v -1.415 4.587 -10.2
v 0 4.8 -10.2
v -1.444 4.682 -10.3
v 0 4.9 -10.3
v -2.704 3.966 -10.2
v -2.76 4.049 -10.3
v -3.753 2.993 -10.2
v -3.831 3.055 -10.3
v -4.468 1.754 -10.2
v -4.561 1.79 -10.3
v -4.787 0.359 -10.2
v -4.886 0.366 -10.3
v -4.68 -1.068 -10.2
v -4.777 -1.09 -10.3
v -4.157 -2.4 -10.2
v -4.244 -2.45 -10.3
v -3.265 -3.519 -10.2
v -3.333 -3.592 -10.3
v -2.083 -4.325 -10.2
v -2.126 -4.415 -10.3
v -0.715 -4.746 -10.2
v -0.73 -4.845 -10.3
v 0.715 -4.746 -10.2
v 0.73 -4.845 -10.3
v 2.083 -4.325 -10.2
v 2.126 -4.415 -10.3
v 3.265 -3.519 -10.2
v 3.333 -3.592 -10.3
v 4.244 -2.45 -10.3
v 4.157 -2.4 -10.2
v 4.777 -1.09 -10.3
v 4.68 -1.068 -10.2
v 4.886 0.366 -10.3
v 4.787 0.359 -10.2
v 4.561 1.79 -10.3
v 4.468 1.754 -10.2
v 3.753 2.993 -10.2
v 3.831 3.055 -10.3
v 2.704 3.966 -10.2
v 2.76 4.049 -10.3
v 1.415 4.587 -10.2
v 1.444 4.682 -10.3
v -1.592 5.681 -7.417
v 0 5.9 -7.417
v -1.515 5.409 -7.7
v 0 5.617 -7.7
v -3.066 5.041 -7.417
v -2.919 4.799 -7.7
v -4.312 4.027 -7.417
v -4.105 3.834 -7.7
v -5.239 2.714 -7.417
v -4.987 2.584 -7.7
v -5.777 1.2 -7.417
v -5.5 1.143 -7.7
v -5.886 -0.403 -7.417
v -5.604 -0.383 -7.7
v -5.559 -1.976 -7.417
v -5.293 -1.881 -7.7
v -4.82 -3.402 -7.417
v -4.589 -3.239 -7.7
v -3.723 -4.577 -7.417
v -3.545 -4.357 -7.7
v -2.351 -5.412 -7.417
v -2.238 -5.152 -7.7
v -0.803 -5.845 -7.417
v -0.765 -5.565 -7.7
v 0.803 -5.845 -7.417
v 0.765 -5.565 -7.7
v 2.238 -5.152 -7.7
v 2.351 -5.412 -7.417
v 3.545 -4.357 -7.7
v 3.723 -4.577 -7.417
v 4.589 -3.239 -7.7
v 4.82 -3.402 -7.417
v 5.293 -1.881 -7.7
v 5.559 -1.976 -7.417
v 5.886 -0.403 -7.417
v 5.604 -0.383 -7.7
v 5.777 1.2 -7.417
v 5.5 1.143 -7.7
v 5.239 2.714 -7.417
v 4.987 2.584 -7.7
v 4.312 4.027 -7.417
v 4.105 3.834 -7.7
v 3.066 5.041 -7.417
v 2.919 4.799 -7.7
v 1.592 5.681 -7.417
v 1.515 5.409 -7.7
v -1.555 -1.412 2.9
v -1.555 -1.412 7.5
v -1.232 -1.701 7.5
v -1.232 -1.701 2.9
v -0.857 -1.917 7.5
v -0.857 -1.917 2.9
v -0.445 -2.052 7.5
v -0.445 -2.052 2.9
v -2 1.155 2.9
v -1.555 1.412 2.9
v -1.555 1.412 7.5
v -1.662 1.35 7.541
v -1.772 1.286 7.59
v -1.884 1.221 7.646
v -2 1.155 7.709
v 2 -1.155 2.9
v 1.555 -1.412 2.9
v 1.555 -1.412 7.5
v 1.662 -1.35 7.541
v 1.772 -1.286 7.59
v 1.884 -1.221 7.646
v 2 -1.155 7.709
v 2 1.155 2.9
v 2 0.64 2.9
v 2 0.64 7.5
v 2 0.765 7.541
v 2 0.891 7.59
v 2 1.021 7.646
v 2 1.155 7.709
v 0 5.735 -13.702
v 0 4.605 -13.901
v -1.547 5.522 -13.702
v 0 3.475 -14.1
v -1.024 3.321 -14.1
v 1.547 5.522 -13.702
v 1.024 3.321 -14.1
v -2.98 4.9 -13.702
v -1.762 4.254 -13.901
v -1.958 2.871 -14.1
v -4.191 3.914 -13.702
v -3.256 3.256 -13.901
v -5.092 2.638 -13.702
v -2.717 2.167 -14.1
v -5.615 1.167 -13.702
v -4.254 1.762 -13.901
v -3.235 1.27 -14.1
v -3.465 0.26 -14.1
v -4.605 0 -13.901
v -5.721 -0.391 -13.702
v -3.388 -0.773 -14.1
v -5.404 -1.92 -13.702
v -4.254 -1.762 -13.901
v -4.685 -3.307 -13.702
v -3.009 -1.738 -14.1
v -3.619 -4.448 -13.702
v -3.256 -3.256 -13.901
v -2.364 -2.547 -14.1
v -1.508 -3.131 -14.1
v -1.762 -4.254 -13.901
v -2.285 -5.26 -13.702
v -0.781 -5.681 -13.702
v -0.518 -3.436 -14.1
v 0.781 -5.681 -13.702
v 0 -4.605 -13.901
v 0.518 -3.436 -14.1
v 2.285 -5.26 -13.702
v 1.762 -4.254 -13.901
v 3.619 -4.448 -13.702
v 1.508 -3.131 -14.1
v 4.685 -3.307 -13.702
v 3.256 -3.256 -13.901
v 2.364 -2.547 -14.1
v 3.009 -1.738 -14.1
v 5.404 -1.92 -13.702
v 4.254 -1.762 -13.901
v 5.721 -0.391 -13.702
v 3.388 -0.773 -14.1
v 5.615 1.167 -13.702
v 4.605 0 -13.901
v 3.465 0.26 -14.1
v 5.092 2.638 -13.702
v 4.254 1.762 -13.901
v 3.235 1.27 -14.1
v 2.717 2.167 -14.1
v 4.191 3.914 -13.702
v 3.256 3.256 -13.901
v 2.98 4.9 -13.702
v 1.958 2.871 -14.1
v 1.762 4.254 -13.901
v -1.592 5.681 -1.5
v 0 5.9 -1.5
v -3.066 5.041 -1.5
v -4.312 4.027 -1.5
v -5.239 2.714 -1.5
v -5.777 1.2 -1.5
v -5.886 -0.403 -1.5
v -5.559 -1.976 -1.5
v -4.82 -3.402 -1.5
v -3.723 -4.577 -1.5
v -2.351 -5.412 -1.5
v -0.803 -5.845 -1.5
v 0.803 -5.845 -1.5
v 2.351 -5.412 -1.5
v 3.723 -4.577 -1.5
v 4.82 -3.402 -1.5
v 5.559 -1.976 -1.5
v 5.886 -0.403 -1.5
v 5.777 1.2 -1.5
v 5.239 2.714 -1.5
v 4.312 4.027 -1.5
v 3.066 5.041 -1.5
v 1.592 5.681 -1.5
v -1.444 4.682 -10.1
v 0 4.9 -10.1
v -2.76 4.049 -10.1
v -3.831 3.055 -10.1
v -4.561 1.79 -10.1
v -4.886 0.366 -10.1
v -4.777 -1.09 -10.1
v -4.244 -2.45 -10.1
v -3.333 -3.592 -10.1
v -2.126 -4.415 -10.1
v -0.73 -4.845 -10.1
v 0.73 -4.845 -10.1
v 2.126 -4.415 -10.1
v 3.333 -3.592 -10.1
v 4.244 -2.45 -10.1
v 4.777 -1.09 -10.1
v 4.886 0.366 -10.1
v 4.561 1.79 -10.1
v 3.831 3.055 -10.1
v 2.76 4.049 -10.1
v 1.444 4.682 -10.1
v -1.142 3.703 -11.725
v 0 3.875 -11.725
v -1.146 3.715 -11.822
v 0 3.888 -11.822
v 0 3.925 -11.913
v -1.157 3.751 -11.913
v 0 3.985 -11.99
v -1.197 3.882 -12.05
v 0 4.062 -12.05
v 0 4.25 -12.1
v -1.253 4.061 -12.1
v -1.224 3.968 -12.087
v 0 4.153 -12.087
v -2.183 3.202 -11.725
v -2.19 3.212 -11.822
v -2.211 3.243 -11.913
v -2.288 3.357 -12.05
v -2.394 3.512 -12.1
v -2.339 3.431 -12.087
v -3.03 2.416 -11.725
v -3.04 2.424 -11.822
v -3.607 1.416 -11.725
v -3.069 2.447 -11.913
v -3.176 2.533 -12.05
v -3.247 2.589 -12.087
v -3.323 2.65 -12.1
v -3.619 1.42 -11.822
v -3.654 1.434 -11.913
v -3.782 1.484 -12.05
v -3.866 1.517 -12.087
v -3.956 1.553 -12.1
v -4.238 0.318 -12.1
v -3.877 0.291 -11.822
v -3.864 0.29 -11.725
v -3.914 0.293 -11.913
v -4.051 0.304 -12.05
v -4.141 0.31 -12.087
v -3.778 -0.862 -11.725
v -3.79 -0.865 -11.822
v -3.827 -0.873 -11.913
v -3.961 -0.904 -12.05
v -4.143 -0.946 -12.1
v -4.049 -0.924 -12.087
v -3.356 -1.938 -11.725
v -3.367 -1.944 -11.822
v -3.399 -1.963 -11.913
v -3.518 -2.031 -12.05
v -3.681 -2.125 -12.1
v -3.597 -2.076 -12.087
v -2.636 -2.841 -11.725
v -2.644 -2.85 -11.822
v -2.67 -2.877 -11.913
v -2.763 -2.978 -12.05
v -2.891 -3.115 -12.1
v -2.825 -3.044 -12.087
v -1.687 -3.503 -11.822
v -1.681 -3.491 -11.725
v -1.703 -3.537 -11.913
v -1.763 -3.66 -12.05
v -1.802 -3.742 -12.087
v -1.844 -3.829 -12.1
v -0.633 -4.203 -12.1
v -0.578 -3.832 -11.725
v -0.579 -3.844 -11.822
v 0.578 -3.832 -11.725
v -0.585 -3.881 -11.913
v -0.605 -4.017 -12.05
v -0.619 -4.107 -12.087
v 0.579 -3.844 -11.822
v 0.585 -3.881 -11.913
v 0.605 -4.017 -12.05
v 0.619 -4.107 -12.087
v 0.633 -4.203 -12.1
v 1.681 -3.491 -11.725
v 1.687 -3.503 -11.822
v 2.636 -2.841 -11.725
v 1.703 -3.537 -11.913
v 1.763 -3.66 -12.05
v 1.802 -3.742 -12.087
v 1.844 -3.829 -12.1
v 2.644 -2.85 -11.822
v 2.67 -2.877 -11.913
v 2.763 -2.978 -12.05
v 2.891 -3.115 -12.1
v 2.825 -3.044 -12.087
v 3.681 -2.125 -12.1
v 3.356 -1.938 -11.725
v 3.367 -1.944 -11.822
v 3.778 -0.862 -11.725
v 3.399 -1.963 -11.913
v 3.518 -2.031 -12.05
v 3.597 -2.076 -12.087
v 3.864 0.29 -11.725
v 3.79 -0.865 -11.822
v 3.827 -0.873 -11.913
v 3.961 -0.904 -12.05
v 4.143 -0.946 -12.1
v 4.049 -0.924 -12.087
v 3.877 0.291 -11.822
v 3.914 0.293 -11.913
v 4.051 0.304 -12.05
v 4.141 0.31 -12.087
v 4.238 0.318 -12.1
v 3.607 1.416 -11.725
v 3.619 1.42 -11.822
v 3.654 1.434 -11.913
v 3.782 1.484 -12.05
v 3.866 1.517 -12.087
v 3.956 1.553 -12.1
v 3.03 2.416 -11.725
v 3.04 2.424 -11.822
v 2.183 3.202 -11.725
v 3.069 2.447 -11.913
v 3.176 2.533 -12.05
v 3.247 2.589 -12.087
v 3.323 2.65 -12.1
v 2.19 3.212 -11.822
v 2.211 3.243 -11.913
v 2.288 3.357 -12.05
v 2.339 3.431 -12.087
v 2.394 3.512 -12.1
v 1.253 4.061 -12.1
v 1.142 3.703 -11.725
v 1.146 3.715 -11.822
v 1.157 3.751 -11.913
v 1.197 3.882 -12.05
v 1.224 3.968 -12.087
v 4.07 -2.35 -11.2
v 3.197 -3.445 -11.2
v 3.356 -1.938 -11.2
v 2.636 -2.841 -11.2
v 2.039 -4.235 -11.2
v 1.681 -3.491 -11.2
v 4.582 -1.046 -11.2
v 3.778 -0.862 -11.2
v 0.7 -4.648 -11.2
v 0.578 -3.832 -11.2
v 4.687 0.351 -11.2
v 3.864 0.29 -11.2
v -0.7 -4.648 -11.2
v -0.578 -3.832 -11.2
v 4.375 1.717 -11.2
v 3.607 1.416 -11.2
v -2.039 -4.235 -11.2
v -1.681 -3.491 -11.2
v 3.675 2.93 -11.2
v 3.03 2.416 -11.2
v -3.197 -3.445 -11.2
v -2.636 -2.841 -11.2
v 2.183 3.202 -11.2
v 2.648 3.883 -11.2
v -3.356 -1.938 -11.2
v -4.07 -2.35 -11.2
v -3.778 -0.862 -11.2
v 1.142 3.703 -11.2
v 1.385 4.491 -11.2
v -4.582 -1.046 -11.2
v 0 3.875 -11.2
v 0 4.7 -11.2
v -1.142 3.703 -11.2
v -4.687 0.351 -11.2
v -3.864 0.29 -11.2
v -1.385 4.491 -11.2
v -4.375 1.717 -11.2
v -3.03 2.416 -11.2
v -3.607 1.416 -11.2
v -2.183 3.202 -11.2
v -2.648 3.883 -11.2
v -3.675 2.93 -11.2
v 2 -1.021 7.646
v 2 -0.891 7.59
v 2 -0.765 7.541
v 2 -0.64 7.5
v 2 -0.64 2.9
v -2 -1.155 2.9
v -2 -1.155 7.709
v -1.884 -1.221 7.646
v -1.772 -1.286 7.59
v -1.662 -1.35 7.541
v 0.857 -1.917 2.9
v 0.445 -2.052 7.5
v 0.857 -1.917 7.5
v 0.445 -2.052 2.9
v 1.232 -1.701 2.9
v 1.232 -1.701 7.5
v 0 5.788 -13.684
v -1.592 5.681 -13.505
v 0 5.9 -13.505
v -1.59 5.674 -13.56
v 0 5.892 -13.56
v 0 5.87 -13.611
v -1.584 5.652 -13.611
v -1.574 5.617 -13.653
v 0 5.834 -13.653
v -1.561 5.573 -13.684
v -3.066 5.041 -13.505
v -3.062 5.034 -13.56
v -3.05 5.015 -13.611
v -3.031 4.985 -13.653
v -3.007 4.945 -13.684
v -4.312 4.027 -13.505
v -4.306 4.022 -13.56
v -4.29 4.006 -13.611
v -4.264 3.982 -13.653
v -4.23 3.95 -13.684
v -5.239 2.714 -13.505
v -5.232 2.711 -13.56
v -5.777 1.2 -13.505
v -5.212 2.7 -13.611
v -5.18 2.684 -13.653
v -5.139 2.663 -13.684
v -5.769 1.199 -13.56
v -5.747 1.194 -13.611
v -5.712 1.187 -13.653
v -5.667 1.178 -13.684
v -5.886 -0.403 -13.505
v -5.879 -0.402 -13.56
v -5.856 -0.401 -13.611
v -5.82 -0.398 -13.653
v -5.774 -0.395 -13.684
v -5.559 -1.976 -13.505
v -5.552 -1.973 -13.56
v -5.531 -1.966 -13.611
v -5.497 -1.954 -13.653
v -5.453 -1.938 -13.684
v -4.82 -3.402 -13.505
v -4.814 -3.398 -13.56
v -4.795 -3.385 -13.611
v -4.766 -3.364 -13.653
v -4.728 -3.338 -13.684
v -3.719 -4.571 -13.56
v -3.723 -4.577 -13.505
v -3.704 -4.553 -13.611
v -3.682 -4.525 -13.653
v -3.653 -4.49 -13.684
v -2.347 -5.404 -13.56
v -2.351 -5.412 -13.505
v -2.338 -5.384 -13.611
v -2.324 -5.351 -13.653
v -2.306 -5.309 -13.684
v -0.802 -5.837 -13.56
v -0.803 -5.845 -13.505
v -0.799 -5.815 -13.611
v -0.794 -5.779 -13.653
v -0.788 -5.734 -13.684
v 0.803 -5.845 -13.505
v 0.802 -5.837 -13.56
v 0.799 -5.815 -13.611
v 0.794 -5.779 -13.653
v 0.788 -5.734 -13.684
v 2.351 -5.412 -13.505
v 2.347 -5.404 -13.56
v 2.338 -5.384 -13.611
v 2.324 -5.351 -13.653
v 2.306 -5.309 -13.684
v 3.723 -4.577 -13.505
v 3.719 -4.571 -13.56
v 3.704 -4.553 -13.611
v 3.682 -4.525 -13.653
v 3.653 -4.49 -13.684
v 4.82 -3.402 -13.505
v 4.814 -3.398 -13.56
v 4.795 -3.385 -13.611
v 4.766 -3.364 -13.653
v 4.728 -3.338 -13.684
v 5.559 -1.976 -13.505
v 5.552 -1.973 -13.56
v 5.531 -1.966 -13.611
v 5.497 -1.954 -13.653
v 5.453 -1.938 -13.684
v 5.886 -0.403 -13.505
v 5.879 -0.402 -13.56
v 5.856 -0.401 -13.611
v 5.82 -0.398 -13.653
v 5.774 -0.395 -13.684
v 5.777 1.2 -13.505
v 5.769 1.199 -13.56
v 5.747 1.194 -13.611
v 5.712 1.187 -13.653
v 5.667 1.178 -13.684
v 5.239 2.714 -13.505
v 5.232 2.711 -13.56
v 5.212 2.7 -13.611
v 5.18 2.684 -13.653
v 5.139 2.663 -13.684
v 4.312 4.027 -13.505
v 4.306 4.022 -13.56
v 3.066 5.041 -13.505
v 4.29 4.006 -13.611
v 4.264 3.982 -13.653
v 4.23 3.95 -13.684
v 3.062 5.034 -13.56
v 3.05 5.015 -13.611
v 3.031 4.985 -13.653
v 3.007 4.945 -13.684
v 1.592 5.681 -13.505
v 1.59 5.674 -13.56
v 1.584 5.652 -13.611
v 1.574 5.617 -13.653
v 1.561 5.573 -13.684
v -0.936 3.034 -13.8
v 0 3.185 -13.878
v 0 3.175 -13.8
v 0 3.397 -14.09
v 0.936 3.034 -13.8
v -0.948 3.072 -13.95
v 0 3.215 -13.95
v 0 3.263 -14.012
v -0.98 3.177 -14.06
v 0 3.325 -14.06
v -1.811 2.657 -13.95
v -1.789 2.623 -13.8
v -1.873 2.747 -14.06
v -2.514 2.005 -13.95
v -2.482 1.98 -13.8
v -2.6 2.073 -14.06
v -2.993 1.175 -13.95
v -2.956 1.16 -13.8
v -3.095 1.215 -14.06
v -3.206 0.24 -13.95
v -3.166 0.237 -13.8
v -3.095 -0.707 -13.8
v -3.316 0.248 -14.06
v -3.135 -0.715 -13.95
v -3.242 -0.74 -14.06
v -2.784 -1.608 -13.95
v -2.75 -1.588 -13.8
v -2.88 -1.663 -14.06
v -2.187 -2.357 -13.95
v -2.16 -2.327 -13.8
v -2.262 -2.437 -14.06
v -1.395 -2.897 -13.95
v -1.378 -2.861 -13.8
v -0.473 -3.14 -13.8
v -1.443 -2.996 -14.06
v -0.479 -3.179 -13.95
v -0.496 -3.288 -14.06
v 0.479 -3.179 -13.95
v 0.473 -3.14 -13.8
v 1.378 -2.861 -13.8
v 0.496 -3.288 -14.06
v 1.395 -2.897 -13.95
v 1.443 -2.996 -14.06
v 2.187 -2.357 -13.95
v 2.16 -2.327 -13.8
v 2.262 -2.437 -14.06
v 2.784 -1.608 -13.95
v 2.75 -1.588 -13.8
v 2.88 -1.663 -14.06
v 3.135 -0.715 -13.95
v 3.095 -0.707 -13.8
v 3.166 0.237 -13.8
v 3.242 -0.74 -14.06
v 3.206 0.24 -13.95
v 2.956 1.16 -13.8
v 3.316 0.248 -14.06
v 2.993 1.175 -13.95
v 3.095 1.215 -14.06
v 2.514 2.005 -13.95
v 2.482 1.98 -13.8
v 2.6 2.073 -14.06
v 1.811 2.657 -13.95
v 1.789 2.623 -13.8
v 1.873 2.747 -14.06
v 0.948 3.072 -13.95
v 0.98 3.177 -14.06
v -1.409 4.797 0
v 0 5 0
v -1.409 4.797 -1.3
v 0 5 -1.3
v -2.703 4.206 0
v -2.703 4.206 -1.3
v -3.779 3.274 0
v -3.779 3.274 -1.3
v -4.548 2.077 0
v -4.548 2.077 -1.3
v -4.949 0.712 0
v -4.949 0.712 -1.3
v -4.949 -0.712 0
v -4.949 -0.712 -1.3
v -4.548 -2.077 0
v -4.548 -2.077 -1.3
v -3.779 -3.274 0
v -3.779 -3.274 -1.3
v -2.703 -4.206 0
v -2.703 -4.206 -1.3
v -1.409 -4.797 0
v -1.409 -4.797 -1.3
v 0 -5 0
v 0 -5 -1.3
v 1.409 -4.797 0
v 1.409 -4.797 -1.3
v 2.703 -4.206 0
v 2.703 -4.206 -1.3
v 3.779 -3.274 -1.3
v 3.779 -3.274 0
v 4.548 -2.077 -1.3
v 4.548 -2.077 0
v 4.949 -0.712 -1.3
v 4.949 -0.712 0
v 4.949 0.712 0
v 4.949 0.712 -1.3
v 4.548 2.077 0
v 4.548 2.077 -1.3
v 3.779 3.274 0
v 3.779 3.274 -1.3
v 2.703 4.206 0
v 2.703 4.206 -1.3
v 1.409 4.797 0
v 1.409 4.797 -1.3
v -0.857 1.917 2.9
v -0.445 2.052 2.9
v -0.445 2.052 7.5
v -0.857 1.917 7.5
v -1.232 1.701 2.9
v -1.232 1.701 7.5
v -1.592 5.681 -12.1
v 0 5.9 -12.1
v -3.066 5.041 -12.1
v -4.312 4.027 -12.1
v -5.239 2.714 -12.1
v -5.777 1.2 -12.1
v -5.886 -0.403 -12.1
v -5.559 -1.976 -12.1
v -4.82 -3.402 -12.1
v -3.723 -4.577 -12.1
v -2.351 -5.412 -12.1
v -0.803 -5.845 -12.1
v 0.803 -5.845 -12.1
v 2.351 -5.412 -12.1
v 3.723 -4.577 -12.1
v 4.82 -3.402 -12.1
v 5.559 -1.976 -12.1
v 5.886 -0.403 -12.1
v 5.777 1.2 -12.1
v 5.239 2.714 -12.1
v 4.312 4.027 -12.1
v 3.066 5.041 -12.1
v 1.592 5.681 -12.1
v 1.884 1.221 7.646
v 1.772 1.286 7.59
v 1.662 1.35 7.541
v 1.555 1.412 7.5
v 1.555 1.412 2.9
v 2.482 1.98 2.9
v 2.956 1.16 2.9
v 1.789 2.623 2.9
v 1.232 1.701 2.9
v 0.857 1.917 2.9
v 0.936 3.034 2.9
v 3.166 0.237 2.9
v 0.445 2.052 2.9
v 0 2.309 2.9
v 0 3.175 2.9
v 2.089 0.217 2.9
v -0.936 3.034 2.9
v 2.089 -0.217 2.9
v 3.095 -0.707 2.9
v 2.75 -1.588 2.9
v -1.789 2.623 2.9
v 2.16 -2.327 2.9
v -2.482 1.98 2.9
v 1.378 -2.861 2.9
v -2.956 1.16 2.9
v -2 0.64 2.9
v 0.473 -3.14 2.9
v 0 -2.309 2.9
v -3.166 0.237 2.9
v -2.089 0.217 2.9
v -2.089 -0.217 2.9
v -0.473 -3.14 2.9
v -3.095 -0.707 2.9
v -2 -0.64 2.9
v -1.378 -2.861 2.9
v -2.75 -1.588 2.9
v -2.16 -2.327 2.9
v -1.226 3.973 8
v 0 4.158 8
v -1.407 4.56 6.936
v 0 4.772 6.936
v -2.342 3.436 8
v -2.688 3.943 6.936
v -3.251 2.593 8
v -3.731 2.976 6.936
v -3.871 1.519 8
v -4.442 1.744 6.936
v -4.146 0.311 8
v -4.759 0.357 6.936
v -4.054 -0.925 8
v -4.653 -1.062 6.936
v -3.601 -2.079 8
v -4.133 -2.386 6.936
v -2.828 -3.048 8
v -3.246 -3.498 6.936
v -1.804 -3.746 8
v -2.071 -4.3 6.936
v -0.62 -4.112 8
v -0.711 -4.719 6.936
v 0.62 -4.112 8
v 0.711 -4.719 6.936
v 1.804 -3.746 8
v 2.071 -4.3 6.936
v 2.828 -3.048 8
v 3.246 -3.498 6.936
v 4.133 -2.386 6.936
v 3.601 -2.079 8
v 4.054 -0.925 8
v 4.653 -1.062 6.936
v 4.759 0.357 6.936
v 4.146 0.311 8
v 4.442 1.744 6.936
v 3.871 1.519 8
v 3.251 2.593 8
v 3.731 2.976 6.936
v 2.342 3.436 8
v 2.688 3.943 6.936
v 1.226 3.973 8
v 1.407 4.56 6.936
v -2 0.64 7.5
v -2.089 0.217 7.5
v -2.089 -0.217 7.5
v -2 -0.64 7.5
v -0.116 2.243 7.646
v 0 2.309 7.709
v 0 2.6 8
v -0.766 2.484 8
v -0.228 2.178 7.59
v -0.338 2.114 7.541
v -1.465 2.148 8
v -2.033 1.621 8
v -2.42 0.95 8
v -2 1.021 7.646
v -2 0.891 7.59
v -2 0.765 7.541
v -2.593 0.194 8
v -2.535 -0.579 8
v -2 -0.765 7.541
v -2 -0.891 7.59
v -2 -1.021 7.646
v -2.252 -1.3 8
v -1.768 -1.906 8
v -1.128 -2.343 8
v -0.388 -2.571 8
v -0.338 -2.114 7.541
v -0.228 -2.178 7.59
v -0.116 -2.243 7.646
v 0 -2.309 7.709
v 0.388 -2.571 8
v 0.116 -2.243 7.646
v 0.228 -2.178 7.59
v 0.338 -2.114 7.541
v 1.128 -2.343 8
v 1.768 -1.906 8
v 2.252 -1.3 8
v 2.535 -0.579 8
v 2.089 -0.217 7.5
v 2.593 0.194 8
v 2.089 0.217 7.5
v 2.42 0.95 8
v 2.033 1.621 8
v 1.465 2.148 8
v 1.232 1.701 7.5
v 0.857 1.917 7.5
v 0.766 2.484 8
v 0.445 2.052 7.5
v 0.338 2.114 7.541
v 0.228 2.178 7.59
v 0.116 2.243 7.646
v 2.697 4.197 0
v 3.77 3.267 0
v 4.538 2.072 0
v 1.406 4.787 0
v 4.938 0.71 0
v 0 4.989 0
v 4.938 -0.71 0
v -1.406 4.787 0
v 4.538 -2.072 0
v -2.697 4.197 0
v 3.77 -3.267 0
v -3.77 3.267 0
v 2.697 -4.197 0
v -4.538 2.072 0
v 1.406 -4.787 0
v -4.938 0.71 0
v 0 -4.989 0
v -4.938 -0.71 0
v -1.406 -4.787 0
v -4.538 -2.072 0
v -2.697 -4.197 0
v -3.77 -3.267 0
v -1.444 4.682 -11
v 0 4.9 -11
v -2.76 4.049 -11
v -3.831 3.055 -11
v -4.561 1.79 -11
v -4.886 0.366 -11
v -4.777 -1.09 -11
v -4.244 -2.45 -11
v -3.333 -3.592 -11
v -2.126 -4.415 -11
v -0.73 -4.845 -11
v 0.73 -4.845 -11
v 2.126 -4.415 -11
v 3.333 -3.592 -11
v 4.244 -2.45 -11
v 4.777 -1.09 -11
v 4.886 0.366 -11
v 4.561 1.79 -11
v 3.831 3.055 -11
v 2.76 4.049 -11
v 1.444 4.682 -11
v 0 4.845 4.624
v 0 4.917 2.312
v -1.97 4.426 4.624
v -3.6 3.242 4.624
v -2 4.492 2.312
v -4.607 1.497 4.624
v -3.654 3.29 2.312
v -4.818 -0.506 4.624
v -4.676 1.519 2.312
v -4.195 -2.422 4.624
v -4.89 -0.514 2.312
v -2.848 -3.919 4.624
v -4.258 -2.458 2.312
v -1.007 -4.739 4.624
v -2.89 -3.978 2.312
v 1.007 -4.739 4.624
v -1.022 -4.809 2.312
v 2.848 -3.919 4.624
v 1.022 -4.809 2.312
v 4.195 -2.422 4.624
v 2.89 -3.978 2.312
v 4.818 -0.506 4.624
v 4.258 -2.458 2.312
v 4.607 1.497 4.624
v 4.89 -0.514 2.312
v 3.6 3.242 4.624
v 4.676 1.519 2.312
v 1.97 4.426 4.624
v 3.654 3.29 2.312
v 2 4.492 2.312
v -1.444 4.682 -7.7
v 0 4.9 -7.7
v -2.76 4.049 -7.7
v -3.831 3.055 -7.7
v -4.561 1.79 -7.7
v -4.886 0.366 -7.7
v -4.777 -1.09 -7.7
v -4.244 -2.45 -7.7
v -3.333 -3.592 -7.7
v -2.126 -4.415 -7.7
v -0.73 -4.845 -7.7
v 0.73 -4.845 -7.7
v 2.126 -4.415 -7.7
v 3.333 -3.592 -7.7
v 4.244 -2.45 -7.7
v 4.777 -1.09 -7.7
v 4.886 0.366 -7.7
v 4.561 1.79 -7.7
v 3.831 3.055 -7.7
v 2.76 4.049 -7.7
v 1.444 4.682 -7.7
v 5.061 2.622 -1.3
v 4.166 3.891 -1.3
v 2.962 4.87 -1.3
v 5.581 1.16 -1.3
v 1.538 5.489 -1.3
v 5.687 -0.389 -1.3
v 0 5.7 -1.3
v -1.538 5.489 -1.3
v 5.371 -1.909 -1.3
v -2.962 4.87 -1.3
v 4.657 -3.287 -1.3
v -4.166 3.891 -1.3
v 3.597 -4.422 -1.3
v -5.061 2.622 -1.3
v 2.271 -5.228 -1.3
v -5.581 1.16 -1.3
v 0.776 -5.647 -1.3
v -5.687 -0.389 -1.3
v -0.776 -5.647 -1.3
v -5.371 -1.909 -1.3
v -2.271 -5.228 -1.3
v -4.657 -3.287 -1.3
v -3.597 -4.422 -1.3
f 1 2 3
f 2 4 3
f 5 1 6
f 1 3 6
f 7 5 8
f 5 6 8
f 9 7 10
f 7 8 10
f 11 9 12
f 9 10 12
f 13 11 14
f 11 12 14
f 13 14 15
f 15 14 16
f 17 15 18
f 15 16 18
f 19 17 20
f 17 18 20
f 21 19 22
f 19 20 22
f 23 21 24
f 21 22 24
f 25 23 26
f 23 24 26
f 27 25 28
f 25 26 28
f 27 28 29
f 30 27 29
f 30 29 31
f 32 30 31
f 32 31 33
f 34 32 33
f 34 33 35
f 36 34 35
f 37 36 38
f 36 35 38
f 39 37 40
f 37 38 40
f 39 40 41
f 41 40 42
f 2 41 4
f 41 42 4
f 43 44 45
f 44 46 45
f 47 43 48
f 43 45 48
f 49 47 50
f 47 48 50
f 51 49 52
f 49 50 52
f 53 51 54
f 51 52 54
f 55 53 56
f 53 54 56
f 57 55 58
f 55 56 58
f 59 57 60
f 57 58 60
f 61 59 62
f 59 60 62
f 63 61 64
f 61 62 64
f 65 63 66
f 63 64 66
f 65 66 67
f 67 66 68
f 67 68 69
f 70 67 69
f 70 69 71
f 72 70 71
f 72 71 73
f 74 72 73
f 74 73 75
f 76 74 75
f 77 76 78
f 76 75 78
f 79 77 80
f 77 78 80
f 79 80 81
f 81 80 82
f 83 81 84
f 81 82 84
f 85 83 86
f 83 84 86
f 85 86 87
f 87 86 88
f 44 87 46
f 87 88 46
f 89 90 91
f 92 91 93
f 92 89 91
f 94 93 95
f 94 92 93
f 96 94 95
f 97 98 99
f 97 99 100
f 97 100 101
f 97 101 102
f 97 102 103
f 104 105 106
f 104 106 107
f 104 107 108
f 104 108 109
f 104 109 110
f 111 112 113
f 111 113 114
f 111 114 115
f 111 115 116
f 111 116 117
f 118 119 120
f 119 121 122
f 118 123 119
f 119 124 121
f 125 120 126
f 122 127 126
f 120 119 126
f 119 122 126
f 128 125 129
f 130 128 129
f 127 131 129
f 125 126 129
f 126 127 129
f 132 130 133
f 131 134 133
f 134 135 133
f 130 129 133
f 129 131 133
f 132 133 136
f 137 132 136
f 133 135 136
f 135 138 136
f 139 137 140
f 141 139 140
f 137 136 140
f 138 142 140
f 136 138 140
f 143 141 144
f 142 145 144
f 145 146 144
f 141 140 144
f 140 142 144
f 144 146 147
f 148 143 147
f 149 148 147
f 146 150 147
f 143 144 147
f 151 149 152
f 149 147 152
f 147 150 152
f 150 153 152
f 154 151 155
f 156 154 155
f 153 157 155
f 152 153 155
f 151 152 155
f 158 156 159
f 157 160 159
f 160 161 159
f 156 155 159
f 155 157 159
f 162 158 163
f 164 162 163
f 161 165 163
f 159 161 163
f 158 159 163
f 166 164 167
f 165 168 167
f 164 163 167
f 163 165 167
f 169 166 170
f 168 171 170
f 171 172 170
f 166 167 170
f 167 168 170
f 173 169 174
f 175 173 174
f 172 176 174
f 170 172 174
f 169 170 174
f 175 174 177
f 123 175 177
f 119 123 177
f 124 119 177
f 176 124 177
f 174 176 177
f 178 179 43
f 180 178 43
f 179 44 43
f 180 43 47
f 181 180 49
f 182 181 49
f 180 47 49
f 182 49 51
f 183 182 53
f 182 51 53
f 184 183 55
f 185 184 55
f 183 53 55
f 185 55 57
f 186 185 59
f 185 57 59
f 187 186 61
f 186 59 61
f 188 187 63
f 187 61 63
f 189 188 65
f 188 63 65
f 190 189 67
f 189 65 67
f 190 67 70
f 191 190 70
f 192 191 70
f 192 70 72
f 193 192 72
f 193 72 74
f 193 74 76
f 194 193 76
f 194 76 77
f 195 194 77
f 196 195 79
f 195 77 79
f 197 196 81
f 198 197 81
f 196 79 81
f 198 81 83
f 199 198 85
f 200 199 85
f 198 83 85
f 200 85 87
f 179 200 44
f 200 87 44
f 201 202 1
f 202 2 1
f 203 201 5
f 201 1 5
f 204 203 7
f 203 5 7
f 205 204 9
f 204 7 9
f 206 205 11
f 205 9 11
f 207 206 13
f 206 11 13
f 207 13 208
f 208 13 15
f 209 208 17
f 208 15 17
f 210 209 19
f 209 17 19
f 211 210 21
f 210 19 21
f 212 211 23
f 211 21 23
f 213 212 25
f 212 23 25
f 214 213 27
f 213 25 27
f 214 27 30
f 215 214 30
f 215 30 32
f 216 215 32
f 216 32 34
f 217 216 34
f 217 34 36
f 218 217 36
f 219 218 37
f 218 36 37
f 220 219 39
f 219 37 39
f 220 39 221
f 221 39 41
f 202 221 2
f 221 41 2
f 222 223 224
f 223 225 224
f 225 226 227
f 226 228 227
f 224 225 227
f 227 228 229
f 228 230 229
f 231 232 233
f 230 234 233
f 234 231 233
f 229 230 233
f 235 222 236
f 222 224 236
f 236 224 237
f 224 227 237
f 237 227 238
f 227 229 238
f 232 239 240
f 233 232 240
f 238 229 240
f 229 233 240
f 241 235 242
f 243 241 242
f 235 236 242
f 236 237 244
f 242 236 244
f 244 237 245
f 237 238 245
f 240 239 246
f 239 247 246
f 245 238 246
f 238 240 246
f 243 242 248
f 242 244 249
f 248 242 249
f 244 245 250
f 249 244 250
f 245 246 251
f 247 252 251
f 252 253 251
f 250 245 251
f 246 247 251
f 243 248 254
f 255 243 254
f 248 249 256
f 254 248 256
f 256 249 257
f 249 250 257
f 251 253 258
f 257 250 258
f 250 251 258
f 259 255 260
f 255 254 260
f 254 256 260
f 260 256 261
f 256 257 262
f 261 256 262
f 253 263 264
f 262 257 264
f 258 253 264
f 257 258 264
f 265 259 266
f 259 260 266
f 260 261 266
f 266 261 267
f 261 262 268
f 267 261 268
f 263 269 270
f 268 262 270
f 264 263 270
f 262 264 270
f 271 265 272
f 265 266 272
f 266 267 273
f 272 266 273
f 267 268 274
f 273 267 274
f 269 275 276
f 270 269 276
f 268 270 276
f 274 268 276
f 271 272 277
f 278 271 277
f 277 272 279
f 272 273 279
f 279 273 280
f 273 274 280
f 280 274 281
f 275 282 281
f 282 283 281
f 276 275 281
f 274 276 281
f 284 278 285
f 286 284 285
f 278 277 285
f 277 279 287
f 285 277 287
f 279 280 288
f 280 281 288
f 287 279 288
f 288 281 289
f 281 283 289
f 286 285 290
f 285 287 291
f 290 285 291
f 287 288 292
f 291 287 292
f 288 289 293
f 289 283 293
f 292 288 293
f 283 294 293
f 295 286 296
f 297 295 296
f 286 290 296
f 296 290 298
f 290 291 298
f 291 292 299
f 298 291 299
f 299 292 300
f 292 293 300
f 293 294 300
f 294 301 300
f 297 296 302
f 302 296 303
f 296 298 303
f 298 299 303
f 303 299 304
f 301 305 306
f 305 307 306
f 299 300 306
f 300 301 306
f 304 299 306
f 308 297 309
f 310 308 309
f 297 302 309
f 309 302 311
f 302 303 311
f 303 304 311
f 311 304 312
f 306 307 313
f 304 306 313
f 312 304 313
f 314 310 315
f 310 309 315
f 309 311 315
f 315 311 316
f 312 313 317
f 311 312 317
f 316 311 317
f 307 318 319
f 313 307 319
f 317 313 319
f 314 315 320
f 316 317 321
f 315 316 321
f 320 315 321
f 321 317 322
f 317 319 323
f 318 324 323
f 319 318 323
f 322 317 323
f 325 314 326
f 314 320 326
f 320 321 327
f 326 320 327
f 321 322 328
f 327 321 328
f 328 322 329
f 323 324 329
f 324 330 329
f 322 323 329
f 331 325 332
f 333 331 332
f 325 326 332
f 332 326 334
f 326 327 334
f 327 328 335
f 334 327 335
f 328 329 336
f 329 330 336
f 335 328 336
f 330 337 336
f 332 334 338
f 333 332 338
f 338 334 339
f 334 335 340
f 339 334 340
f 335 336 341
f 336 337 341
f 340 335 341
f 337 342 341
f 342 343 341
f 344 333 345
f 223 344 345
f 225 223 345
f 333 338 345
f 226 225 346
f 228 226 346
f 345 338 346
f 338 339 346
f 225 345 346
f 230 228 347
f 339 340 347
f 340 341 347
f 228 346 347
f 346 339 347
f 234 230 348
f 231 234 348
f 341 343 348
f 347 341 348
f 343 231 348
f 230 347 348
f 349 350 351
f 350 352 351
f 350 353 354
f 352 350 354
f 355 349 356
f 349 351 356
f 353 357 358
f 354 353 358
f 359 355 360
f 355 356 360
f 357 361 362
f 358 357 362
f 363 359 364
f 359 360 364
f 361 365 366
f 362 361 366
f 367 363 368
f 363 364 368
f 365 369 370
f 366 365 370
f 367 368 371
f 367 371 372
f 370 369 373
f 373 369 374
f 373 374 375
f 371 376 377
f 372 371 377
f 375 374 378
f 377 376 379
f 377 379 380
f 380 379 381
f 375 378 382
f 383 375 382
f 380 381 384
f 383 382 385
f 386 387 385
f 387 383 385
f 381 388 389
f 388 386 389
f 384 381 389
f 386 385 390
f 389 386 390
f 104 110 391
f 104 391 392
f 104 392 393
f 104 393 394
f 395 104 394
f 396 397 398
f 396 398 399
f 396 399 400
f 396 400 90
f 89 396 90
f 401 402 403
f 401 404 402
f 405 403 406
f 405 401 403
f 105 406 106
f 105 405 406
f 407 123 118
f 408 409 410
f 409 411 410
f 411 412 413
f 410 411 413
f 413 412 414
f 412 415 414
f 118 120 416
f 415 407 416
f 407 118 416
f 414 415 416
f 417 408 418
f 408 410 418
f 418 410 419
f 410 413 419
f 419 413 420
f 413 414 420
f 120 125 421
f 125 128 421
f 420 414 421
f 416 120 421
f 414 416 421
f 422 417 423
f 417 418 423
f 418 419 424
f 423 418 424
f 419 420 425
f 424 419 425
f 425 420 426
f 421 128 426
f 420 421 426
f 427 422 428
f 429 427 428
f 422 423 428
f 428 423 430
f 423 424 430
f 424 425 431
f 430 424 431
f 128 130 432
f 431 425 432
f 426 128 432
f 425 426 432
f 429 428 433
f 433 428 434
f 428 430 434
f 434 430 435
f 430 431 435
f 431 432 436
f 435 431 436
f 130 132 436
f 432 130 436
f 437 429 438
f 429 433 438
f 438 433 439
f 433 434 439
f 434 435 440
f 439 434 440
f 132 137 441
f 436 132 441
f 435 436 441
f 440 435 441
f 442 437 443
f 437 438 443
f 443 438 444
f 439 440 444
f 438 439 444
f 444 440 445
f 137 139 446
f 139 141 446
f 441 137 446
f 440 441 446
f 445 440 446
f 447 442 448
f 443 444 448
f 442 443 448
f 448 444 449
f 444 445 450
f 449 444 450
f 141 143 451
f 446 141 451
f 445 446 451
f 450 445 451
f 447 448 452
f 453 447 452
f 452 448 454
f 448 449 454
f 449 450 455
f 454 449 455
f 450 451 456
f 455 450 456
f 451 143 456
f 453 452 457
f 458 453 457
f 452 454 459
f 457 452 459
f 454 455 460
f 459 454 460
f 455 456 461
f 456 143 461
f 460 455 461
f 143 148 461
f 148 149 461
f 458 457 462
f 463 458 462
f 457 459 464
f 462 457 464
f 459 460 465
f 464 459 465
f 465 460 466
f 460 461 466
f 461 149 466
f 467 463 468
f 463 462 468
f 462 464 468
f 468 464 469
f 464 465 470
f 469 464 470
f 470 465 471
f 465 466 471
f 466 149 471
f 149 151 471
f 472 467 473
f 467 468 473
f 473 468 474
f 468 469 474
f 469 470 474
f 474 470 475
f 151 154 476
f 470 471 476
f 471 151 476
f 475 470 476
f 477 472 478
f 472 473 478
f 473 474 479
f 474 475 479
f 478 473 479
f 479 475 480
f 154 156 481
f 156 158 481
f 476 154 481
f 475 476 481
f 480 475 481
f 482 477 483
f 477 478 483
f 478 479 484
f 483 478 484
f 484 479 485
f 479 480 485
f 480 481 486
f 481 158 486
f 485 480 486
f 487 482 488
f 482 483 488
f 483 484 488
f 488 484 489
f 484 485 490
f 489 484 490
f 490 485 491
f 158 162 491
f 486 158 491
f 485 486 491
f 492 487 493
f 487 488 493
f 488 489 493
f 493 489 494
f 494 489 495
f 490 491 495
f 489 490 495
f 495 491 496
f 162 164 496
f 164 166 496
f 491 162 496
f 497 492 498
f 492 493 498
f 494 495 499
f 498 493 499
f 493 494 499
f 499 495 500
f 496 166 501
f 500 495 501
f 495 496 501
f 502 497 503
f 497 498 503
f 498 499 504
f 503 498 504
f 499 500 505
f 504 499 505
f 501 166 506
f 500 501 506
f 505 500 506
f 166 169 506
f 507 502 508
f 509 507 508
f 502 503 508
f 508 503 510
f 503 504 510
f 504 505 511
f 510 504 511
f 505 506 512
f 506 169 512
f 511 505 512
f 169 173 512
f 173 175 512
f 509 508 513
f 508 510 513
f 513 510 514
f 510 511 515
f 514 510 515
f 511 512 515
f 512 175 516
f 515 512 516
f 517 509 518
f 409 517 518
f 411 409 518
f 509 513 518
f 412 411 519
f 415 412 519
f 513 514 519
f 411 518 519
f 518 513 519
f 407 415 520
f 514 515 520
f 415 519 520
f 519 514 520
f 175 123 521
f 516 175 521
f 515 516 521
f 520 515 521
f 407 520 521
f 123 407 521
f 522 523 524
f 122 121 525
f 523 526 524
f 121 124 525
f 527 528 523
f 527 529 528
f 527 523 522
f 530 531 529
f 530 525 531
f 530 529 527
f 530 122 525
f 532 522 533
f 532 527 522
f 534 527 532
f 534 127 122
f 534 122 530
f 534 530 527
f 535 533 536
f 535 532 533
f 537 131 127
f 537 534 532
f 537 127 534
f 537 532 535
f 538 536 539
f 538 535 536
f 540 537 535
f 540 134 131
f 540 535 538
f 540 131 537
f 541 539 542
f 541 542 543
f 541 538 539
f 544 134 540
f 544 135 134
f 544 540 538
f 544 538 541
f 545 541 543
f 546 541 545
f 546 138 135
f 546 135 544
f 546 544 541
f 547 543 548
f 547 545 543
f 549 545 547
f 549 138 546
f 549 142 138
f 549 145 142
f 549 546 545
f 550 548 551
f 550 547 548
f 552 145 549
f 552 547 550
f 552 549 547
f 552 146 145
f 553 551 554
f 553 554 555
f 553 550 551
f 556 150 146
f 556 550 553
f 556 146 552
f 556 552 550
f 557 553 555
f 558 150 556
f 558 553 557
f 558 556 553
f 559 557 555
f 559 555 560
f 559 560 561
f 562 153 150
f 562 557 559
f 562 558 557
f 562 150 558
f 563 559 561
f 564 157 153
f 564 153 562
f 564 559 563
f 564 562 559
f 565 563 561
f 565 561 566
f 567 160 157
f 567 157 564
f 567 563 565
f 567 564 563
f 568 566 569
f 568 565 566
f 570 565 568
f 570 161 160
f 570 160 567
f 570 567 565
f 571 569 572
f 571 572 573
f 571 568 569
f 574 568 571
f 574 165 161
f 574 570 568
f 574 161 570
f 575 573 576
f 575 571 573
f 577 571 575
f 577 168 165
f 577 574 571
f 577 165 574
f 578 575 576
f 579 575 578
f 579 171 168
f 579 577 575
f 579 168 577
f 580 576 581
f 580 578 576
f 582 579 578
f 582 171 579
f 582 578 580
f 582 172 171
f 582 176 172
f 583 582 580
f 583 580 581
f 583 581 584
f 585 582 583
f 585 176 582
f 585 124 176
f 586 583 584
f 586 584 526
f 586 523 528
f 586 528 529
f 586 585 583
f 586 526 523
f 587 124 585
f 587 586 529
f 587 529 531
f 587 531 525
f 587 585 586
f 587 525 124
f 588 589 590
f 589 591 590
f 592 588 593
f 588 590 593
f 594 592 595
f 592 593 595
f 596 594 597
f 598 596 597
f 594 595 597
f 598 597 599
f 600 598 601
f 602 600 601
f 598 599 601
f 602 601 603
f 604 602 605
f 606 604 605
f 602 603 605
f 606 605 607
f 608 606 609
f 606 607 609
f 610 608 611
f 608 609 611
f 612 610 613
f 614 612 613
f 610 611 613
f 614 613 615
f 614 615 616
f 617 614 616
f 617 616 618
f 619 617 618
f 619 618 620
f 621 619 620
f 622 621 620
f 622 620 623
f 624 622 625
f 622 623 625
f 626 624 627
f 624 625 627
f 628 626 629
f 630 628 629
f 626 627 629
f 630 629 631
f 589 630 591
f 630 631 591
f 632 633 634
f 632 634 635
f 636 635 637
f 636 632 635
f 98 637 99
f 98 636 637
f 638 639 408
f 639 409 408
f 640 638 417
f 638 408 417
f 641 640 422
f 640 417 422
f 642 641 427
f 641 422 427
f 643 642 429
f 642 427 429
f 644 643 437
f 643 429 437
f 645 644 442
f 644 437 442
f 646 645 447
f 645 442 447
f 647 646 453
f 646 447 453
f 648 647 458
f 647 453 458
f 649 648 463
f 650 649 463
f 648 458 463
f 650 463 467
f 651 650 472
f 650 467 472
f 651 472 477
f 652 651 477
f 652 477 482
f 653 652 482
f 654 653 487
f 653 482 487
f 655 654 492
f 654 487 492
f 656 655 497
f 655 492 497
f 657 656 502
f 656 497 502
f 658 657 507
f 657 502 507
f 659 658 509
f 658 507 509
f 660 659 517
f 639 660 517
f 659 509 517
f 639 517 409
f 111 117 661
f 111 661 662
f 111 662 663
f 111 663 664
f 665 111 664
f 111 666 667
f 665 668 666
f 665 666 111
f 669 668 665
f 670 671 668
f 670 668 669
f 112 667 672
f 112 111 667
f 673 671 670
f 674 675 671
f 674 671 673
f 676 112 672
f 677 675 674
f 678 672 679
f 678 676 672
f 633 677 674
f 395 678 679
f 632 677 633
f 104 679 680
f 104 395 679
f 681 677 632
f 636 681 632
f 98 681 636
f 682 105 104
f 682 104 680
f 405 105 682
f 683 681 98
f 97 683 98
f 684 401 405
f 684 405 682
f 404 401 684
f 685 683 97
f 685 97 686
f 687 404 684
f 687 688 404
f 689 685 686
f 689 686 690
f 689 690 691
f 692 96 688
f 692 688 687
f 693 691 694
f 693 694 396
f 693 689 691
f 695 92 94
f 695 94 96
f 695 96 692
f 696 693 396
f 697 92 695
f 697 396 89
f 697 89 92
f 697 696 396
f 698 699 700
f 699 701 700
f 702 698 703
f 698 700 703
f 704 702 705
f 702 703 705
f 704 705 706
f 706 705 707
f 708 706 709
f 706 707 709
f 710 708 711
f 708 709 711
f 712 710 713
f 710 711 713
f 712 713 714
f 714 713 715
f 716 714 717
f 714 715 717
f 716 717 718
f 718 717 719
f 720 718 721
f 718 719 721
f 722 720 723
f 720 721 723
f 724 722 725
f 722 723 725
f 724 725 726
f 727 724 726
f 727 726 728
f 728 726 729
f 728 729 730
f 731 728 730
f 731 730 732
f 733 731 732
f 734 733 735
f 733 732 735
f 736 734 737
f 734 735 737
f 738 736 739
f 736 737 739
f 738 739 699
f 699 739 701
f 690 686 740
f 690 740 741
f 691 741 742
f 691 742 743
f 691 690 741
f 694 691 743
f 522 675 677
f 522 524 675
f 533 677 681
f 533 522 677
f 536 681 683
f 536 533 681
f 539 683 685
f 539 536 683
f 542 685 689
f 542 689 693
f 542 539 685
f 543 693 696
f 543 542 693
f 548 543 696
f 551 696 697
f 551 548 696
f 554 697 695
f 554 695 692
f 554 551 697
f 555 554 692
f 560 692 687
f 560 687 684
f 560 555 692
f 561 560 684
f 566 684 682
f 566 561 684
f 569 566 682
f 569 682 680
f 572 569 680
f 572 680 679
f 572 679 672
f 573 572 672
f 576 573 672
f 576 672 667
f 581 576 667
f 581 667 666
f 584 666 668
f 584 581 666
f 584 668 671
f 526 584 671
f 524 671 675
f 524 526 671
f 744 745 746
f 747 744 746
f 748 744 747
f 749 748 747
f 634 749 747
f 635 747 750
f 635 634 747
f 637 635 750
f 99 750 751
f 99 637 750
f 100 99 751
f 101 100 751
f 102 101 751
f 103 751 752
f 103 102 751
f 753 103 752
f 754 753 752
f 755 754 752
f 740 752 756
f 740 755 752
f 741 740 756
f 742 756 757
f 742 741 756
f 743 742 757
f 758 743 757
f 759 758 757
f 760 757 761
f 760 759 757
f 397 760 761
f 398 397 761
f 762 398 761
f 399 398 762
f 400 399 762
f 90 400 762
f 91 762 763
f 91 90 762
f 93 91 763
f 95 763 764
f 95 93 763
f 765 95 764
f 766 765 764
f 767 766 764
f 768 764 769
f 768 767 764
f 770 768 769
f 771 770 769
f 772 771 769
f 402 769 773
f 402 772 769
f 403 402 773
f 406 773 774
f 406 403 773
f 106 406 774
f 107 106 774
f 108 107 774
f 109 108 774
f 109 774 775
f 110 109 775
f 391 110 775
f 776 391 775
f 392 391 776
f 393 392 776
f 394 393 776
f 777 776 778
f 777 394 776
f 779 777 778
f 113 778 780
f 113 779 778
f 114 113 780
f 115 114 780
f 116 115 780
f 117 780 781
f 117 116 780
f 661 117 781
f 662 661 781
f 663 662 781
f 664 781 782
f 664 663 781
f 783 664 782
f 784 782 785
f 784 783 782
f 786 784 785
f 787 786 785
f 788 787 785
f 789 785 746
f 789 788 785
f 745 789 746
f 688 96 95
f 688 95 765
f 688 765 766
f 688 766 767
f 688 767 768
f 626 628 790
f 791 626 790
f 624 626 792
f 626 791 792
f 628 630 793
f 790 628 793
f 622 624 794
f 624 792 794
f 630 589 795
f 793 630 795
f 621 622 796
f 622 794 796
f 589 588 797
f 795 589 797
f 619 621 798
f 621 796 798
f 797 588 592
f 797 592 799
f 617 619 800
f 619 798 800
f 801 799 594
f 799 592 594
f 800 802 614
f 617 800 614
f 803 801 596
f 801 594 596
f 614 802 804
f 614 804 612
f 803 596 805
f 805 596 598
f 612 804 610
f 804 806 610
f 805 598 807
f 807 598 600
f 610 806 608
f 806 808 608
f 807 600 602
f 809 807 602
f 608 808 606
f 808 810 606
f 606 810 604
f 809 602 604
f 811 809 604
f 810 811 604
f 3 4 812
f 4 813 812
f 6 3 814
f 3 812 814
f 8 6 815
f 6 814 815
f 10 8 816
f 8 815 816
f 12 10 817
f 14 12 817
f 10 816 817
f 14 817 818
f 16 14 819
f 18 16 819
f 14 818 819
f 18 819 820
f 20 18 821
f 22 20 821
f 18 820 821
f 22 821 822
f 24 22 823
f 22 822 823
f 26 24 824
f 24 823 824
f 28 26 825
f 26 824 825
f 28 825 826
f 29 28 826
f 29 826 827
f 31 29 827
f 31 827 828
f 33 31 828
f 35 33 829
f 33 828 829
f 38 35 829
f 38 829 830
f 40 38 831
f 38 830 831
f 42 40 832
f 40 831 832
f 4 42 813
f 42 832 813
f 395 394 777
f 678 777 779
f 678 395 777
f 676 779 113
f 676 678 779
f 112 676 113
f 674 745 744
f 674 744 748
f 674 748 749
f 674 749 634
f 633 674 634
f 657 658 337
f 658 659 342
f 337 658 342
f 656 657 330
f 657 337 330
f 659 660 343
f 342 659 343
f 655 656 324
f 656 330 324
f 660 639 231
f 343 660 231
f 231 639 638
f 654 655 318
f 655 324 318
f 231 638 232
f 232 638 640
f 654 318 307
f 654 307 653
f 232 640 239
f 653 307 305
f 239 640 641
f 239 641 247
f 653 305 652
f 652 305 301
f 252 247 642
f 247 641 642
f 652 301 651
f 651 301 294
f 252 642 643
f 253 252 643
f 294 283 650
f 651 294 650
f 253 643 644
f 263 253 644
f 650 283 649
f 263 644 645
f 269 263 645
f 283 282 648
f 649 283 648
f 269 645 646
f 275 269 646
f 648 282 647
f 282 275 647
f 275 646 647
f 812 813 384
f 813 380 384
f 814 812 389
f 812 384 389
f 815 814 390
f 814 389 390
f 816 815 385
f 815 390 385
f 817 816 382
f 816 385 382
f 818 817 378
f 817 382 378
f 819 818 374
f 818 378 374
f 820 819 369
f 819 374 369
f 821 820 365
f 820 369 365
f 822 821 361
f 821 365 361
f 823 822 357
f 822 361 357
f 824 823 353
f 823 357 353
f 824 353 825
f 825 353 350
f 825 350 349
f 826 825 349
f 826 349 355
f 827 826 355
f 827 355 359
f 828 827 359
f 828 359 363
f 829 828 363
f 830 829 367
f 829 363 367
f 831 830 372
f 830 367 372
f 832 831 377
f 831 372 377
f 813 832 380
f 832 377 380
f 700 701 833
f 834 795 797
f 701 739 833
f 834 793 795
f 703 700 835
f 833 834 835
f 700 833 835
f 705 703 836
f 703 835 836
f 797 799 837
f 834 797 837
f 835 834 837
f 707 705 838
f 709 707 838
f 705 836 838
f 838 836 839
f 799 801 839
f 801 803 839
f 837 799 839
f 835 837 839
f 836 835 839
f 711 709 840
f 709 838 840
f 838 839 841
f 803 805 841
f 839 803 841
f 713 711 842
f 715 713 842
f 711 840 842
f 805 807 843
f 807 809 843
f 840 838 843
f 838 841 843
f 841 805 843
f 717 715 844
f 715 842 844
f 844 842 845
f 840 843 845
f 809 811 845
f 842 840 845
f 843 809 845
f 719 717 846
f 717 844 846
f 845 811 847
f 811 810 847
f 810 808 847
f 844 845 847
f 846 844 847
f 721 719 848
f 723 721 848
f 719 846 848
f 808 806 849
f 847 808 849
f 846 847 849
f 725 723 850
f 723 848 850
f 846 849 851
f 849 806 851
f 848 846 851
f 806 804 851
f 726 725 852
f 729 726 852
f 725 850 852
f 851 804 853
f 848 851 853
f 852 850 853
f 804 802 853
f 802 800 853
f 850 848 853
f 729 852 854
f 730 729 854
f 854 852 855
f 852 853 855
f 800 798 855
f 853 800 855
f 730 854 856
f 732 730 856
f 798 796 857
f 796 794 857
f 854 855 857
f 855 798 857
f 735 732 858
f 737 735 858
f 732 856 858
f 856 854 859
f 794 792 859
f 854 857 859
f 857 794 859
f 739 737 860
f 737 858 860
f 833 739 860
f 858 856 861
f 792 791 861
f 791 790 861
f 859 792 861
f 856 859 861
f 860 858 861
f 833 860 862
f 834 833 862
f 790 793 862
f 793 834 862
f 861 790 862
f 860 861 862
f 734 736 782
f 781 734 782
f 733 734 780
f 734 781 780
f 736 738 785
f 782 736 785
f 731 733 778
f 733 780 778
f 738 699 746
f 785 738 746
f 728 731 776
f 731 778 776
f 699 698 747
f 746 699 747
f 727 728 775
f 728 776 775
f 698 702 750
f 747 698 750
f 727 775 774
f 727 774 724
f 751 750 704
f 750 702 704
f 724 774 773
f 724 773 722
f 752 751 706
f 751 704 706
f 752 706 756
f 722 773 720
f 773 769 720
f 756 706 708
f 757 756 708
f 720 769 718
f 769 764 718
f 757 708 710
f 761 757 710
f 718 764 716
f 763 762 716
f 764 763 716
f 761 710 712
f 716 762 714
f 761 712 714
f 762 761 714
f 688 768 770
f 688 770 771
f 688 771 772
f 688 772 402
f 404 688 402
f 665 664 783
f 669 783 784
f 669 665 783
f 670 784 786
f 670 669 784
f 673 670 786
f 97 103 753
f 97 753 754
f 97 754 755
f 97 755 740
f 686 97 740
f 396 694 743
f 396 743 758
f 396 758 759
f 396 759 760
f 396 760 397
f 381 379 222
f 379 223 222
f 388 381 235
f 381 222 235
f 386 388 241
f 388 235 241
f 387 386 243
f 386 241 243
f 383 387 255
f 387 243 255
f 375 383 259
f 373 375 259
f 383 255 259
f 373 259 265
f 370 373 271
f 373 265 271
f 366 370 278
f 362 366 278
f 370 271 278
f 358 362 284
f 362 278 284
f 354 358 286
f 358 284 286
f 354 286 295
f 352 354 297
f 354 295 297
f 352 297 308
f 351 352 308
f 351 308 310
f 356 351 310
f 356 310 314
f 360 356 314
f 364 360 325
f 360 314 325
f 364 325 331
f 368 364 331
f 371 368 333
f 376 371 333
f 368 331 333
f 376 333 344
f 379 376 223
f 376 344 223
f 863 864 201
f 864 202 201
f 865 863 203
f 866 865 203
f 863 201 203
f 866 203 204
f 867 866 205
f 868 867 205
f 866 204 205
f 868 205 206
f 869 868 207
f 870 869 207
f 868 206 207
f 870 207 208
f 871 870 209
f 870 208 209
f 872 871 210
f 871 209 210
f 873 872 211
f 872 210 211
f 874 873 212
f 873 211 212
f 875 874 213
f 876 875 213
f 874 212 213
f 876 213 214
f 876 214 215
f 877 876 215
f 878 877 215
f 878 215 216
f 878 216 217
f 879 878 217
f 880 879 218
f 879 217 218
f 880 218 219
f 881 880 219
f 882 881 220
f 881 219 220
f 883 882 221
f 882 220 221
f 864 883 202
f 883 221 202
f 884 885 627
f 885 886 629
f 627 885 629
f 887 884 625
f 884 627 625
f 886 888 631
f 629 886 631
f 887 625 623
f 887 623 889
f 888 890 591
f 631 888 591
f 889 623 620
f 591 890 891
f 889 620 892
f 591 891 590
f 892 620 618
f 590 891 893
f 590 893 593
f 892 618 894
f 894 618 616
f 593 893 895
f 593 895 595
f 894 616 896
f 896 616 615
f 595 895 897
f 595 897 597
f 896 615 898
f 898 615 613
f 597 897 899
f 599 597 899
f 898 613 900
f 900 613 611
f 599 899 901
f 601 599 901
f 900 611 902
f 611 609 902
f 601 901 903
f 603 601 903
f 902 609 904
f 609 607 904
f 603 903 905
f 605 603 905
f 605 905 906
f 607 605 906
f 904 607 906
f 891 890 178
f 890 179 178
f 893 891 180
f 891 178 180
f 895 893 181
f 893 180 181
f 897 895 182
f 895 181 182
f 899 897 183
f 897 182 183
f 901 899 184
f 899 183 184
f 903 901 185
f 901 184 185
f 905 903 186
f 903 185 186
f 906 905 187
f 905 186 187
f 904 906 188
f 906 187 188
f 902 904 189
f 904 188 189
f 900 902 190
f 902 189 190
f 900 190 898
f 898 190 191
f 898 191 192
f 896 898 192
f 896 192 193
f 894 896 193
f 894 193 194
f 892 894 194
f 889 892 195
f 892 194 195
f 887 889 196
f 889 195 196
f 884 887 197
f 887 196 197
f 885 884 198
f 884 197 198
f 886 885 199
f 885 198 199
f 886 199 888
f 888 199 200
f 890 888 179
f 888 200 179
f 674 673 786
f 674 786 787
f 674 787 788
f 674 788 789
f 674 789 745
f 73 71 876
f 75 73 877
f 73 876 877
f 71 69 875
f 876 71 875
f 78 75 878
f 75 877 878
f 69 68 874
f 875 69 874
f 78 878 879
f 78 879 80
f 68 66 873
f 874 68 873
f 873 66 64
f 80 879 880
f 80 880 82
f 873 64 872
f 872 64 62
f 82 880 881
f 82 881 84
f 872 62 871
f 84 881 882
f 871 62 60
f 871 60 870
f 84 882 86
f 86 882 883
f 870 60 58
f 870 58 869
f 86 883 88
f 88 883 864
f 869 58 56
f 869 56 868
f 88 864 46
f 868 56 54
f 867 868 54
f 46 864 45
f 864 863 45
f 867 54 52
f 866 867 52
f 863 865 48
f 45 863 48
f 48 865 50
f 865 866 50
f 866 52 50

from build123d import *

# Parameters (mm, degrees)
CUT_EXTRUDE1_DEPTH = 5.1


with BuildPart() as part:
    # Sketch1 → Revolve1 (revolve)
    with BuildSketch(Plane(origin=(0, 0, 0), x_dir=(0, 0, -1), z_dir=(1, 0, 0))):
        with BuildLine():
            Line((0, 0), (0, 5.9))
            Line((0, 5.9), (7.417157288, 5.9))
            Line((7.417157288, 5.9), (7.7, 5.617157288))
            Line((7.7, 5.617157288), (7.7, 4.9))
            Line((7.7, 4.9), (10.1, 4.9))
            Line((10.1, 4.9), (10.2, 4.8))
            Line((10.2, 4.8), (10.3, 4.9))
            Line((10.3, 4.9), (11, 4.9))
            Line((11, 4.9), (11.2, 4.7))
            Line((11.2, 4.7), (11.2, 3.875))
            Line((11.2, 3.875), (11.725, 3.875))
            ThreePointArc((11.725, 3.875), (11.990165043, 3.984834957), (12.1, 4.25))
            Line((12.1, 4.25), (12.1, 5.9))
            Line((12.1, 5.9), (13.504587146, 5.9))
            ThreePointArc((13.504587146, 5.9), (13.633144667, 5.853208889), (13.701548696, 5.734729636))
            Line((13.701548696, 5.734729636), (14.1, 3.475))
            Line((14.1, 3.475), (14.1, 0))
            Line((14.1, 0), (0, 0))
        make_face()
    revolve(axis=Axis((0, 0, -14.1), (0, 0, 1)))

    # Sketch2 → Revolve2 (revolve)
    with BuildSketch(Plane(origin=(0, 0, 0), x_dir=(0, 0, -1), z_dir=(1, 0, 0))):
        Polygon((-8, 0), (-8, 4.158121832), (-6.93615215, 4.772334675), (0, 4.988878168), (0, 0), align=None)
    revolve(axis=Axis((0, 0, 0), (0, 0, 1)))

    # Sketch3 → Cut-Revolve1 (revolve, cut)
    with BuildSketch(Plane(origin=(0, 0, 0), x_dir=(0, 0, -1), z_dir=(1, 0, 0))):
        Polygon((0, 5.9), (0, 5), (1.3, 5), (1.3, 5.7), (1.5, 5.9), align=None)
    revolve(axis=Axis((0, 0, -50), (0, 0, 1)), mode=Mode.SUBTRACT)

    # Sketch4 → Cut-Revolve2 (revolve, cut)
    with BuildSketch(Plane(origin=(0, 0, 0), x_dir=(0, 0, -1), z_dir=(1, 0, 0))):
        with BuildLine():
            Line((-8, 0), (-8, 2.6))
            Line((-8, 2.6), (-7.5, 2.1))
            Line((-7.5, 2.1), (-2.9, 2.1))
            Line((-2.9, 2.1), (-2.9, 3.175))
            Line((-2.9, 3.175), (13.8, 3.175))
            ThreePointArc((13.8, 3.175), (14.012132034, 3.262867966), (14.1, 3.475))
            Line((14.1, 3.475), (14.1, 0))
            Line((14.1, 0), (-8, 0))
        make_face()
    revolve(axis=Axis((0, 0, -14.1), (0, 0, 1)), mode=Mode.SUBTRACT)

    # Sketch5 → Cut-Extrude1 (cut)
    with BuildSketch(Plane.XY.offset(2.9)):
        Polygon((-2, -1.154700538), (0, -2.309401077), (2, -1.154700538), (2, 1.154700538), (0, 2.309401077), (-2, 1.154700538), align=None)
    extrude(amount=CUT_EXTRUDE1_DEPTH, mode=Mode.SUBTRACT)


solid = part.part
